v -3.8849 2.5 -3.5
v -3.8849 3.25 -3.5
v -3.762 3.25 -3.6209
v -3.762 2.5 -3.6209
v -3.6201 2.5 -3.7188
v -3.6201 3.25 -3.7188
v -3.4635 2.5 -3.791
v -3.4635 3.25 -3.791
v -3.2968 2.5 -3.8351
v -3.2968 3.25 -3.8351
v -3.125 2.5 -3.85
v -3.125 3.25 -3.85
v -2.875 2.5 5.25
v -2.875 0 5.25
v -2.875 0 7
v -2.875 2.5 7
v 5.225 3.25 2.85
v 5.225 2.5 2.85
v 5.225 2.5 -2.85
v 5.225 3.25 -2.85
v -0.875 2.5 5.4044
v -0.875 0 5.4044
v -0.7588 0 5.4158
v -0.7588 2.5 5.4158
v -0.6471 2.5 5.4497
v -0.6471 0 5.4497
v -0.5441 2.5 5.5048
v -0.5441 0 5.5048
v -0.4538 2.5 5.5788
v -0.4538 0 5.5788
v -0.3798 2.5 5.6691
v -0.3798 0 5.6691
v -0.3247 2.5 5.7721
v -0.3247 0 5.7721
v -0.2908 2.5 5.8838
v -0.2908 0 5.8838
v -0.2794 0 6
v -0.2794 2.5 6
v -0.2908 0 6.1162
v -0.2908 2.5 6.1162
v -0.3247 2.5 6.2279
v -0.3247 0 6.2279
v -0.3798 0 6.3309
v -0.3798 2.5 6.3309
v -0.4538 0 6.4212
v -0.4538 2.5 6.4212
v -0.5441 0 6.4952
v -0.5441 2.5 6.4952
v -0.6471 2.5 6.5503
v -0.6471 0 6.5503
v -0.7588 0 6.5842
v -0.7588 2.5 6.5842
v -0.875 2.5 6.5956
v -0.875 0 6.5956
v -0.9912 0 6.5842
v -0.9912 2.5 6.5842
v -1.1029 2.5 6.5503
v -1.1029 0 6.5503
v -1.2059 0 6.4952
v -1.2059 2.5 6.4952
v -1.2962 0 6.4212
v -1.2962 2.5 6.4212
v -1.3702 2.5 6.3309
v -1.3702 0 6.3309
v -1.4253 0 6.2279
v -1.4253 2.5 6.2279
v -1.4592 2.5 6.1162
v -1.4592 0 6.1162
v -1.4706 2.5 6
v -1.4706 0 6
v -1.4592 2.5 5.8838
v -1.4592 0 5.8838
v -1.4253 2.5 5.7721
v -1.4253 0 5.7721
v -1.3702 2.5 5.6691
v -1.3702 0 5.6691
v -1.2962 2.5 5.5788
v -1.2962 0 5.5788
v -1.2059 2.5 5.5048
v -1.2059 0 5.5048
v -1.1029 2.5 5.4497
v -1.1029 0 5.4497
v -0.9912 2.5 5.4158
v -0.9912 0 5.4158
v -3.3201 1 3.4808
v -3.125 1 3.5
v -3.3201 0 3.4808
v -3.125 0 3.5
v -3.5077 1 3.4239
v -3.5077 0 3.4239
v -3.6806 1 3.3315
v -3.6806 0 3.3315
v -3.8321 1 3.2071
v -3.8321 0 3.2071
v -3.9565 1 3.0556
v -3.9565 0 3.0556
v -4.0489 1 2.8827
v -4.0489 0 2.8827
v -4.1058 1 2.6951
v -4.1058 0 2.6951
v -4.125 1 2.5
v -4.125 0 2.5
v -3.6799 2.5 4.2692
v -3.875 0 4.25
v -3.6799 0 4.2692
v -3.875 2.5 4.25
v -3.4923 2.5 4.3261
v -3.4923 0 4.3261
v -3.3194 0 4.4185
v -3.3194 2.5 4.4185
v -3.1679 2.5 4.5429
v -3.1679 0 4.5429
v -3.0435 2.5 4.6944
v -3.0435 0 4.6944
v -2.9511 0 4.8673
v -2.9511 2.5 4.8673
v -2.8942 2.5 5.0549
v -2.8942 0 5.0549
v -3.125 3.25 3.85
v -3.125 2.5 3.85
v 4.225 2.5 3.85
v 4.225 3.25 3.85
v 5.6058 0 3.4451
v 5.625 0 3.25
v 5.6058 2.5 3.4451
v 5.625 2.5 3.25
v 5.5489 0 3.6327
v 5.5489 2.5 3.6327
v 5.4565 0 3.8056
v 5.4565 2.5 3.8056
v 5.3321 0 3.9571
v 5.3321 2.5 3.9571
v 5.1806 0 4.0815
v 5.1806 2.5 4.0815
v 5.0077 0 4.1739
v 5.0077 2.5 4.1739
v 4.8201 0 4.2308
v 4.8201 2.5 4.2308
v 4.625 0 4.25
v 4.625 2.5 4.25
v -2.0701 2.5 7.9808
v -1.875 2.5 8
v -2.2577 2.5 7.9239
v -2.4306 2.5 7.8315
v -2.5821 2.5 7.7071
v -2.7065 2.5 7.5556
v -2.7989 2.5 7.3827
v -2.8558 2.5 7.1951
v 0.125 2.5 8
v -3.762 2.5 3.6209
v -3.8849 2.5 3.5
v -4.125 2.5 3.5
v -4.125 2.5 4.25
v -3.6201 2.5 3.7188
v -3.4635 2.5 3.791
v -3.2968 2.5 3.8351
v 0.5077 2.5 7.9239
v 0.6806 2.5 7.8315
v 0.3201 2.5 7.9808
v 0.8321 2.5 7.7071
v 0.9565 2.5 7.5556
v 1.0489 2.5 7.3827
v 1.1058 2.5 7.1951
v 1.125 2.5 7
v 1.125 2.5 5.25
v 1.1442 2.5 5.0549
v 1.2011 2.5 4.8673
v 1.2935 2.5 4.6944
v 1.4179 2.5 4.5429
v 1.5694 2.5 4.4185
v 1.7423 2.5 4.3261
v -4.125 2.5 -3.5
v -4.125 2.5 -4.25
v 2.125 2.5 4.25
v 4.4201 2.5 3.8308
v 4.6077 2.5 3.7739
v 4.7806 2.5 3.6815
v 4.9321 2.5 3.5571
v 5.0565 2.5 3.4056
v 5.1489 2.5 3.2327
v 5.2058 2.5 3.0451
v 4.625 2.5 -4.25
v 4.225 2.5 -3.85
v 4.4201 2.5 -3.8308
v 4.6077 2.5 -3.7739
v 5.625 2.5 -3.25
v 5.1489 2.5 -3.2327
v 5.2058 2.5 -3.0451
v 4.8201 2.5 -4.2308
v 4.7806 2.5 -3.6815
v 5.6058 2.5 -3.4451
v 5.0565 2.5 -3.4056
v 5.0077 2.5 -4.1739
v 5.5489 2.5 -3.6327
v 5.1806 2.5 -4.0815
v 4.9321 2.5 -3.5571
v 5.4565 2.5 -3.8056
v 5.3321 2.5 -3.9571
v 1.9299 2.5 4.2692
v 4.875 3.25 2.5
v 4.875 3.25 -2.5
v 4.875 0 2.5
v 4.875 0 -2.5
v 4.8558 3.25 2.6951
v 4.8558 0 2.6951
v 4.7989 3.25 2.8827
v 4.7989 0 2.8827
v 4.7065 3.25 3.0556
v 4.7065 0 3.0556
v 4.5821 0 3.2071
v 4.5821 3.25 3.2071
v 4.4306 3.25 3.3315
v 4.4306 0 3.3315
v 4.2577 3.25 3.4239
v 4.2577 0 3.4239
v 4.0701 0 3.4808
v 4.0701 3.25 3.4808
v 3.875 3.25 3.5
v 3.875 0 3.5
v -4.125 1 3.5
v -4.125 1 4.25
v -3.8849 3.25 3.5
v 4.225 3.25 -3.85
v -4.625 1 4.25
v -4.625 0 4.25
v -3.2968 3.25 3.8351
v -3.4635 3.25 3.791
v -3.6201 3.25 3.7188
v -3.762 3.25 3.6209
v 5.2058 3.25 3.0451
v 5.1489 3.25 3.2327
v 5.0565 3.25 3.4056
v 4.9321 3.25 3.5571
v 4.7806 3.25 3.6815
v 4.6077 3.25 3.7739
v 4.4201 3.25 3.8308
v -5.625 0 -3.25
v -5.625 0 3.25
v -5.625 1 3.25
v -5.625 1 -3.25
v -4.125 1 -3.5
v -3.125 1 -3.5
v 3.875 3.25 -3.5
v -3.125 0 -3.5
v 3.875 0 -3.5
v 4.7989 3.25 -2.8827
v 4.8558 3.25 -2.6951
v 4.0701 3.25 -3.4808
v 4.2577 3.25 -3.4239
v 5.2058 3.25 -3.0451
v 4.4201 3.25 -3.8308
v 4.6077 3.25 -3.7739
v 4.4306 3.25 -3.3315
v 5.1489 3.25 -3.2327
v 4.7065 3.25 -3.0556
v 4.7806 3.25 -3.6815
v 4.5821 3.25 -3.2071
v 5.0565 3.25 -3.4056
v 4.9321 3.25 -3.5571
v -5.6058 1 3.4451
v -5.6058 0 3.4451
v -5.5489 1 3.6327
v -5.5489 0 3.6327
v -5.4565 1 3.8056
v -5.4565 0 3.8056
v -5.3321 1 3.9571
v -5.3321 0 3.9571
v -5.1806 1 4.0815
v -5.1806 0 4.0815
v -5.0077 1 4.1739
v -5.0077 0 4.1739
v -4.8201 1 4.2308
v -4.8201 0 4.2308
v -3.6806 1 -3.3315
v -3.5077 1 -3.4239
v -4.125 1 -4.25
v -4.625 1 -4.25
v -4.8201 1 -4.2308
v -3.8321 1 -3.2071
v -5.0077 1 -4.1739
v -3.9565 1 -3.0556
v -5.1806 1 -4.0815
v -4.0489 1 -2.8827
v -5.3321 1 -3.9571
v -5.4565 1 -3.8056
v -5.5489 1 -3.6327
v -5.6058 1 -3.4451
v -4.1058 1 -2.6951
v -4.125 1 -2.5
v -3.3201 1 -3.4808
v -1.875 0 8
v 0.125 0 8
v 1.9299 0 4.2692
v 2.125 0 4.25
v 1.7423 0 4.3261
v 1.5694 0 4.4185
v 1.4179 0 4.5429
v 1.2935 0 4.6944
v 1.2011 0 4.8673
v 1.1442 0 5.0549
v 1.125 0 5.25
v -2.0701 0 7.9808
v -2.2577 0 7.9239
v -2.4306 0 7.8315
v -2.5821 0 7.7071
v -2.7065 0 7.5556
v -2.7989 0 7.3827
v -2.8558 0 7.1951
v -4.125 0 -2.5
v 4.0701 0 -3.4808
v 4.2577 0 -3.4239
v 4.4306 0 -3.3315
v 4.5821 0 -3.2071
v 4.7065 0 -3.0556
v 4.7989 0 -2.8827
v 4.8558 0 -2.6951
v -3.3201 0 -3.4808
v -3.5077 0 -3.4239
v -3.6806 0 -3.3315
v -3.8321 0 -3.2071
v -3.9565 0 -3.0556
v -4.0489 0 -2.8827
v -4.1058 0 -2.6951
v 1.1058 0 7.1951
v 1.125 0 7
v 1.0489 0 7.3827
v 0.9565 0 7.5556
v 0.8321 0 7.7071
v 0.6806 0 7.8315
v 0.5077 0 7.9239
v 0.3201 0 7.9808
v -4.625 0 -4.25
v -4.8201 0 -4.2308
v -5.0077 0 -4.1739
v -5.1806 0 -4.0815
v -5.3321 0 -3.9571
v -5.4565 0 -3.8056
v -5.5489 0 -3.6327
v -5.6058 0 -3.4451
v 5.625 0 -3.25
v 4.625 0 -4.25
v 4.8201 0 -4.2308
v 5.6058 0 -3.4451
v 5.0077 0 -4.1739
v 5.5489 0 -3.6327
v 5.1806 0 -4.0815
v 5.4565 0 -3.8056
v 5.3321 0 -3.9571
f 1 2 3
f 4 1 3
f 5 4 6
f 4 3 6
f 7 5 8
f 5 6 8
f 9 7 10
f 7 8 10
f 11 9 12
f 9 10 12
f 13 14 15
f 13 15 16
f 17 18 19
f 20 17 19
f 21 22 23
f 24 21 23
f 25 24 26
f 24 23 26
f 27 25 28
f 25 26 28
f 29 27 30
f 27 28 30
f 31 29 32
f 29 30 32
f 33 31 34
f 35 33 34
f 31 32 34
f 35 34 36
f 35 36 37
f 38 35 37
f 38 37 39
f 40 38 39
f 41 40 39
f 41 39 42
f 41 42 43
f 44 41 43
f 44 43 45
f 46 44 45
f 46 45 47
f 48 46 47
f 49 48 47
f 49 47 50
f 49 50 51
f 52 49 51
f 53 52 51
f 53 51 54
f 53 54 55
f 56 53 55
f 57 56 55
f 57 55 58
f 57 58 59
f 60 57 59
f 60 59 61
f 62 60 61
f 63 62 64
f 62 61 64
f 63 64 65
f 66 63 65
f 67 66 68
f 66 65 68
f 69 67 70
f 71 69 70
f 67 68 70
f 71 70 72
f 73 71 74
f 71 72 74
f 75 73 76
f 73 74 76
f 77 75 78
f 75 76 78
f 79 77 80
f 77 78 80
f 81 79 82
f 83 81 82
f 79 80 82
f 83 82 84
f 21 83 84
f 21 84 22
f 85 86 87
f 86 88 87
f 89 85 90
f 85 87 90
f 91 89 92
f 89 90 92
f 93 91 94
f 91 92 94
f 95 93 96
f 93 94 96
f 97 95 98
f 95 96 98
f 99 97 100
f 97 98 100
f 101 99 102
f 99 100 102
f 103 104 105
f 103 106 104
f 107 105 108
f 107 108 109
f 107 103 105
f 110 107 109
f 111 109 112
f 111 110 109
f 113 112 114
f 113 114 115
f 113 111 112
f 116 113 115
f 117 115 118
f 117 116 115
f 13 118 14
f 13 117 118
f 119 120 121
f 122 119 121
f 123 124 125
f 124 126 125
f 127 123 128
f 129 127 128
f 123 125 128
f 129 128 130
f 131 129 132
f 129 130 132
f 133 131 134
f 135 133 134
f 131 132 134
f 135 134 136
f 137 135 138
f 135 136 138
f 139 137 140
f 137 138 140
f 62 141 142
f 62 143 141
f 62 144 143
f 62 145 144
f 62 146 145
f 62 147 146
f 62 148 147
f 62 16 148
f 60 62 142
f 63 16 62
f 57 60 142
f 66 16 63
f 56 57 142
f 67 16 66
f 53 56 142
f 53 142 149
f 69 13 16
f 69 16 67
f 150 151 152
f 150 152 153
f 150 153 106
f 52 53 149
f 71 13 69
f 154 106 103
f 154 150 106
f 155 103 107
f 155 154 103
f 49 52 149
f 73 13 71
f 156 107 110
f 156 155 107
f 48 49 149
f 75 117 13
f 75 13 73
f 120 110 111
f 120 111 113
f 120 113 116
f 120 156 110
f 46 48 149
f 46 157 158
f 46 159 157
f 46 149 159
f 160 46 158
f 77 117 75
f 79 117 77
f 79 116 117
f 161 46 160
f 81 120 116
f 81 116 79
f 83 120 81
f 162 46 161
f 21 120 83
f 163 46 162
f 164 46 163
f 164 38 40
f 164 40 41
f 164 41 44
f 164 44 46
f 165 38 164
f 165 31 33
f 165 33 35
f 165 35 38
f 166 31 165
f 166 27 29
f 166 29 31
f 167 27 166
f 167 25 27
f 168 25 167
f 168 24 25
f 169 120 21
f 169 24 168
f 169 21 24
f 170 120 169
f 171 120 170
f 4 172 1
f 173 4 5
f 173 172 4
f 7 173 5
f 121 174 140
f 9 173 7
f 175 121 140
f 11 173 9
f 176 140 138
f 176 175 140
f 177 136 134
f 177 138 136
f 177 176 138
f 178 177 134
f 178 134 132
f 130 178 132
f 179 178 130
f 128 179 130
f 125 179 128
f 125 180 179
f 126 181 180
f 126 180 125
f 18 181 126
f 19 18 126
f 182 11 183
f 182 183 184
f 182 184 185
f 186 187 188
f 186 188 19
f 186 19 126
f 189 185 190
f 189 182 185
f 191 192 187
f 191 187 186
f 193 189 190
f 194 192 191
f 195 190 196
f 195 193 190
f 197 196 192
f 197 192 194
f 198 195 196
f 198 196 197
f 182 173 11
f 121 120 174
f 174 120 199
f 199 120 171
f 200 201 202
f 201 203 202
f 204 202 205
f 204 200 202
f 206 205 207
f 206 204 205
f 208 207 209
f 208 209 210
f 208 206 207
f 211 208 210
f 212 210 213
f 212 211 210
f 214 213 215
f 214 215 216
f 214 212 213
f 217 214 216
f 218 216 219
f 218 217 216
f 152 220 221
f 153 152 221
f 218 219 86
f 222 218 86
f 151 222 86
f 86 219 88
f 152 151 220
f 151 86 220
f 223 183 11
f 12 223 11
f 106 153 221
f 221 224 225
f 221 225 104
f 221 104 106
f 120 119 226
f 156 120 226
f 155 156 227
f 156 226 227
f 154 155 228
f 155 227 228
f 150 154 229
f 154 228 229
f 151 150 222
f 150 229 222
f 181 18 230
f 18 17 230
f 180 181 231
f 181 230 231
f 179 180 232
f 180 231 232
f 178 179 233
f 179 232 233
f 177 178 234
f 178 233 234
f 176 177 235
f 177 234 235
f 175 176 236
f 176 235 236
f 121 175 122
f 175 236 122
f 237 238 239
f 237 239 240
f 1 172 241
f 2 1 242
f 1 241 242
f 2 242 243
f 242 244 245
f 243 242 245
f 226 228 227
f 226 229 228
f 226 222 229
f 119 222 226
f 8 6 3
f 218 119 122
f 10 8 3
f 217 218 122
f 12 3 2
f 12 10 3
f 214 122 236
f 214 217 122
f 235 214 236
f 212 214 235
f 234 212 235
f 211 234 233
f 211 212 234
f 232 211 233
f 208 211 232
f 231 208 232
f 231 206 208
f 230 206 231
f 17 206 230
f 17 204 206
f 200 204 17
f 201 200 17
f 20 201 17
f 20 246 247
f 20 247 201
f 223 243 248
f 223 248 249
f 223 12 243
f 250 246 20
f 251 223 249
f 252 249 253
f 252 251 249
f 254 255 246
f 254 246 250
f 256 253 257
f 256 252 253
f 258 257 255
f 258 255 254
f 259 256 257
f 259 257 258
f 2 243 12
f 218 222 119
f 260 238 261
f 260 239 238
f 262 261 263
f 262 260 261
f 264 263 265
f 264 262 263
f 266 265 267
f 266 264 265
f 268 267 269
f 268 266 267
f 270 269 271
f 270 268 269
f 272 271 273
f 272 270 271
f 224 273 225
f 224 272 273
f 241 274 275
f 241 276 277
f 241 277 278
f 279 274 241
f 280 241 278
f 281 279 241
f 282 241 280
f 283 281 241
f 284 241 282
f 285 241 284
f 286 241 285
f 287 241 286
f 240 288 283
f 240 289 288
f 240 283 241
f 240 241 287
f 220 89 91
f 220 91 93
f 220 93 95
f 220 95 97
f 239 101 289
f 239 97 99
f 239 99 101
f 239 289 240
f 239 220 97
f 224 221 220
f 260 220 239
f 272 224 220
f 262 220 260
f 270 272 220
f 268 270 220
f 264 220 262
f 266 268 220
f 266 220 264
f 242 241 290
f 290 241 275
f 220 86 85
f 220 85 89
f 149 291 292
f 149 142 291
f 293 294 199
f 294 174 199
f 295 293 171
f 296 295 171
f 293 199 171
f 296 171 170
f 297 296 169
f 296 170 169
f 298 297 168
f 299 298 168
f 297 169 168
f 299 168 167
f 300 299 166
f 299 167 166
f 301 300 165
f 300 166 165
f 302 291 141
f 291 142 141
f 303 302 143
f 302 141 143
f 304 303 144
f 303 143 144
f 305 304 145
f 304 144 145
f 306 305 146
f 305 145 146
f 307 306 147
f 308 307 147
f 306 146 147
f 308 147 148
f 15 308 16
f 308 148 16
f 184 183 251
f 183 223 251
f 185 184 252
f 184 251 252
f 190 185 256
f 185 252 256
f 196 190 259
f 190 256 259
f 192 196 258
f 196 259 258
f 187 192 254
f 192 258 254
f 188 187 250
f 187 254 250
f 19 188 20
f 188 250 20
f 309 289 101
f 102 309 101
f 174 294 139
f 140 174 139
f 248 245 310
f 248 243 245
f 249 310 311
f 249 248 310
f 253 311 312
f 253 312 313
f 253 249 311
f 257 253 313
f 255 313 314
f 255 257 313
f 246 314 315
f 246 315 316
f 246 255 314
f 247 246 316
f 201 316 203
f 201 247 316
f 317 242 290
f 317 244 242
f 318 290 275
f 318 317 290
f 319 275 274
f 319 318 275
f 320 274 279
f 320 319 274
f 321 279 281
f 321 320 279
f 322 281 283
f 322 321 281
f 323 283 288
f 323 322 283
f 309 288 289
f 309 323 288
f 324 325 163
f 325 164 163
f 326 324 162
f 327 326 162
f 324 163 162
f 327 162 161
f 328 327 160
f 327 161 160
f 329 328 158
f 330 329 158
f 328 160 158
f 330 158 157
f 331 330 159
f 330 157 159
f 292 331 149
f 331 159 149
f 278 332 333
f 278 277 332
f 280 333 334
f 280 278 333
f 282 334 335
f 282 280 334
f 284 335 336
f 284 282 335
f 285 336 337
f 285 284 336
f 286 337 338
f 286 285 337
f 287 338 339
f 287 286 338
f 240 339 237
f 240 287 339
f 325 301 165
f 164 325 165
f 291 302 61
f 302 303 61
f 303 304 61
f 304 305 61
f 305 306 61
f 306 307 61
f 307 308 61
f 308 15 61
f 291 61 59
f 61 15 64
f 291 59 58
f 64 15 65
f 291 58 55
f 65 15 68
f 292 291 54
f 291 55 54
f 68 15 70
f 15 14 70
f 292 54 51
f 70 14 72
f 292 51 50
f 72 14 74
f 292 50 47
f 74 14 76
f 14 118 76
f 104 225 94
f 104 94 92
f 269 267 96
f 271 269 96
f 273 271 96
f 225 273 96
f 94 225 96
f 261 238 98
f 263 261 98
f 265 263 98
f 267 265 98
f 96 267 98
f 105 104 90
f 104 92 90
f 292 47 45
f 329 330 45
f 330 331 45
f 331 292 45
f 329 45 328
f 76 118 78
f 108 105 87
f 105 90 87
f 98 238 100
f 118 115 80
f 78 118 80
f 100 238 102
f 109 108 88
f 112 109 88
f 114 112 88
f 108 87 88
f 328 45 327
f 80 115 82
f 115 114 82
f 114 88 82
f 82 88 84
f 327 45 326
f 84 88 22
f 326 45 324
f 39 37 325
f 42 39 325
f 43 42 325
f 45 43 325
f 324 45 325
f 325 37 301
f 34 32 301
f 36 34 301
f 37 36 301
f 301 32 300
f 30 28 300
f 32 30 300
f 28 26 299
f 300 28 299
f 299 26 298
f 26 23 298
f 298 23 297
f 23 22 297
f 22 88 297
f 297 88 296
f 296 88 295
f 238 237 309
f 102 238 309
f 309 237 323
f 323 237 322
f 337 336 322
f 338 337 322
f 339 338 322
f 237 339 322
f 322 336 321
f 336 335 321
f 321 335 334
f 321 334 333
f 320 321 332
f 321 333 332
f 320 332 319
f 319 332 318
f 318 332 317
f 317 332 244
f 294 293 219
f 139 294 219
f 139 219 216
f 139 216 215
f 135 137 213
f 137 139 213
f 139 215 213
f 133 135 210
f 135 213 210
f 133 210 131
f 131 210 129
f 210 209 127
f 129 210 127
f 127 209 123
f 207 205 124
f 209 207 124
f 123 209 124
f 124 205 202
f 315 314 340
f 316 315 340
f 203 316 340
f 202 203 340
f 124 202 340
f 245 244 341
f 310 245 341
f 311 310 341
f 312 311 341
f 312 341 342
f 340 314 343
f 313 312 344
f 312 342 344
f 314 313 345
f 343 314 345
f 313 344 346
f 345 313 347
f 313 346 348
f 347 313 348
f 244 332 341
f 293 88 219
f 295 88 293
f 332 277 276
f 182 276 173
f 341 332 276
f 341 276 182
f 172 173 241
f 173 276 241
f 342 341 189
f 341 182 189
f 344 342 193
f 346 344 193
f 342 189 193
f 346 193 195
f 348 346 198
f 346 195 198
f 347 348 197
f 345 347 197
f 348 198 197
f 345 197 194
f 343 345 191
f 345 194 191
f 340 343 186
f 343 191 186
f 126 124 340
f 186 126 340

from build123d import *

# Parameters (mm, degrees)
SKETCH5_W                 = 11.25
SKETCH5_H                 = 8.5
EXTRUDE4_DEPTH            = 2.5
SKETCH19_W                = 1.5
SKETCH19_H                = 8.5
EXTRUDE12_DEPTH           = 1.5
SKETCH21_W                = 9
SKETCH21_H                = 7
EXTRUDE13_DEPTH           = 3.5
SKETCH22_W                = 4
SKETCH22_H                = 2.5
EXTRUDE14_DEPTH           = 3.75
EXTRUDE15_DEPTH           = 0.75
F_0_80_TAPPED_HOLE1_D     = 1.19126
F_0_80_TAPPED_HOLE1_DEPTH = 79.01
F_0_80_TAPPED_HOLE1_TIP   = 0.357890611
FILLET4_R                 = 1
EXTRUDE16_DEPTH           = 0.75
EXTRUDE17_DEPTH           = 0.75


with BuildPart() as part:
    # Sketch5 → Extrude4 (new body)
    with BuildSketch(Plane(origin=(0, 0, 0), x_dir=(1, 0, 0), z_dir=(0, 1, 0))):
        Rectangle(SKETCH5_W, SKETCH5_H)
    extrude(amount=EXTRUDE4_DEPTH)

    # Sketch19 → Extrude12 (cut)
    with BuildSketch(Plane(origin=(0, 2.5, 0), x_dir=(-1, 0, 0), z_dir=(0, 1, 0))):
        with Locations((4.875, 0)):
            Rectangle(SKETCH19_W, SKETCH19_H)
    extrude(amount=-EXTRUDE12_DEPTH, mode=Mode.SUBTRACT)

    # Sketch21 → Extrude13 (cut, through all)
    with BuildSketch(Plane(origin=(0, 2.5, 0), x_dir=(-1, 0, 0), z_dir=(0, 1, 0))):
        with Locations((-0.375, 0)):
            Rectangle(SKETCH21_W, SKETCH21_H)
    extrude(amount=-EXTRUDE13_DEPTH, mode=Mode.SUBTRACT)

    # Sketch22 → Extrude14 (add)
    with BuildSketch(Plane.XY.offset(4.25)):
        with Locations((-0.875, 1.25)):
            Rectangle(SKETCH22_W, SKETCH22_H)
    extrude(amount=EXTRUDE14_DEPTH)

    # Sketch24 → Extrude15 (add)
    with BuildSketch(Plane(origin=(0, 2.5, 0), x_dir=(1, 0, 0), z_dir=(0, 1, 0))):
        Polygon((-4.125, 3.85), (-4.125, 3.5), (4.875, 3.5), (4.875, -3.5), (-4.125, -3.5), (-4.125, -3.85), (5.225, -3.85), (5.225, 3.85), align=None)
    extrude(amount=EXTRUDE15_DEPTH)

    # #0-80 Tapped Hole1
    with Locations(Plane(origin=(-0.875, 2.5, 6), x_dir=(0, 0, 1), z_dir=(0, 1, 0))):
        with Locations((0, 0)):
            Hole(F_0_80_TAPPED_HOLE1_D / 2, depth=F_0_80_TAPPED_HOLE1_DEPTH)
            with Locations((0, 0, -(F_0_80_TAPPED_HOLE1_DEPTH + F_0_80_TAPPED_HOLE1_TIP / 2))):  # 118° drill point
                Cone(0, F_0_80_TAPPED_HOLE1_D / 2, F_0_80_TAPPED_HOLE1_TIP, mode=Mode.SUBTRACT)

    # Fillet4
    fillet4_edges = [part.edges().sort_by_distance(p)[0] for p in [
        (5.625, 1.25, -4.25),
        (5.225, 2.875, -3.85),
        (5.625, 1.25, 4.25),
        (5.225, 2.875, 3.85),
        (4.875, 1.625, 3.5),
        (4.875, 1.625, -3.5),
        (-4.125, 0.5, 3.5),
        (-4.125, 0.5, -3.5),
        (-5.625, 0.5, -4.25),
        (-5.625, 0.5, 4.25),
        (-2.875, 1.25, 4.25),
        (-2.875, 1.25, 8),
        (1.125, 1.25, 8),
        (1.125, 1.25, 4.25),
    ]]
    fillet(fillet4_edges, radius=FILLET4_R)

    # Sketch28 → Extrude16 (cut)
    with BuildSketch(Plane(origin=(0, 3.25, 0), x_dir=(-1, 0, 0), z_dir=(0, 1, 0))):
        with BuildLine():
            Line((3.125, -3.85), (4.125, -3.85))
            Line((4.125, -3.85), (4.125, -2.85))
            ThreePointArc((4.125, -2.85), (3.832106781, -3.557106781), (3.125, -3.85))
        make_face()
    extrude(amount=-EXTRUDE16_DEPTH, mode=Mode.SUBTRACT)

    # Sketch31 → Extrude17 (cut)
    with BuildSketch(Plane(origin=(0, 3.25, 0), x_dir=(-1, 0, 0), z_dir=(0, 1, 0))):
        with BuildLine():
            Line((4.125, 2.85), (4.125, 3.85))
            Line((4.125, 3.85), (3.125, 3.85))
            ThreePointArc((3.125, 3.85), (3.832106781, 3.557106781), (4.125, 2.85))
        make_face()
    extrude(amount=-EXTRUDE17_DEPTH, mode=Mode.SUBTRACT)


solid = part.part
